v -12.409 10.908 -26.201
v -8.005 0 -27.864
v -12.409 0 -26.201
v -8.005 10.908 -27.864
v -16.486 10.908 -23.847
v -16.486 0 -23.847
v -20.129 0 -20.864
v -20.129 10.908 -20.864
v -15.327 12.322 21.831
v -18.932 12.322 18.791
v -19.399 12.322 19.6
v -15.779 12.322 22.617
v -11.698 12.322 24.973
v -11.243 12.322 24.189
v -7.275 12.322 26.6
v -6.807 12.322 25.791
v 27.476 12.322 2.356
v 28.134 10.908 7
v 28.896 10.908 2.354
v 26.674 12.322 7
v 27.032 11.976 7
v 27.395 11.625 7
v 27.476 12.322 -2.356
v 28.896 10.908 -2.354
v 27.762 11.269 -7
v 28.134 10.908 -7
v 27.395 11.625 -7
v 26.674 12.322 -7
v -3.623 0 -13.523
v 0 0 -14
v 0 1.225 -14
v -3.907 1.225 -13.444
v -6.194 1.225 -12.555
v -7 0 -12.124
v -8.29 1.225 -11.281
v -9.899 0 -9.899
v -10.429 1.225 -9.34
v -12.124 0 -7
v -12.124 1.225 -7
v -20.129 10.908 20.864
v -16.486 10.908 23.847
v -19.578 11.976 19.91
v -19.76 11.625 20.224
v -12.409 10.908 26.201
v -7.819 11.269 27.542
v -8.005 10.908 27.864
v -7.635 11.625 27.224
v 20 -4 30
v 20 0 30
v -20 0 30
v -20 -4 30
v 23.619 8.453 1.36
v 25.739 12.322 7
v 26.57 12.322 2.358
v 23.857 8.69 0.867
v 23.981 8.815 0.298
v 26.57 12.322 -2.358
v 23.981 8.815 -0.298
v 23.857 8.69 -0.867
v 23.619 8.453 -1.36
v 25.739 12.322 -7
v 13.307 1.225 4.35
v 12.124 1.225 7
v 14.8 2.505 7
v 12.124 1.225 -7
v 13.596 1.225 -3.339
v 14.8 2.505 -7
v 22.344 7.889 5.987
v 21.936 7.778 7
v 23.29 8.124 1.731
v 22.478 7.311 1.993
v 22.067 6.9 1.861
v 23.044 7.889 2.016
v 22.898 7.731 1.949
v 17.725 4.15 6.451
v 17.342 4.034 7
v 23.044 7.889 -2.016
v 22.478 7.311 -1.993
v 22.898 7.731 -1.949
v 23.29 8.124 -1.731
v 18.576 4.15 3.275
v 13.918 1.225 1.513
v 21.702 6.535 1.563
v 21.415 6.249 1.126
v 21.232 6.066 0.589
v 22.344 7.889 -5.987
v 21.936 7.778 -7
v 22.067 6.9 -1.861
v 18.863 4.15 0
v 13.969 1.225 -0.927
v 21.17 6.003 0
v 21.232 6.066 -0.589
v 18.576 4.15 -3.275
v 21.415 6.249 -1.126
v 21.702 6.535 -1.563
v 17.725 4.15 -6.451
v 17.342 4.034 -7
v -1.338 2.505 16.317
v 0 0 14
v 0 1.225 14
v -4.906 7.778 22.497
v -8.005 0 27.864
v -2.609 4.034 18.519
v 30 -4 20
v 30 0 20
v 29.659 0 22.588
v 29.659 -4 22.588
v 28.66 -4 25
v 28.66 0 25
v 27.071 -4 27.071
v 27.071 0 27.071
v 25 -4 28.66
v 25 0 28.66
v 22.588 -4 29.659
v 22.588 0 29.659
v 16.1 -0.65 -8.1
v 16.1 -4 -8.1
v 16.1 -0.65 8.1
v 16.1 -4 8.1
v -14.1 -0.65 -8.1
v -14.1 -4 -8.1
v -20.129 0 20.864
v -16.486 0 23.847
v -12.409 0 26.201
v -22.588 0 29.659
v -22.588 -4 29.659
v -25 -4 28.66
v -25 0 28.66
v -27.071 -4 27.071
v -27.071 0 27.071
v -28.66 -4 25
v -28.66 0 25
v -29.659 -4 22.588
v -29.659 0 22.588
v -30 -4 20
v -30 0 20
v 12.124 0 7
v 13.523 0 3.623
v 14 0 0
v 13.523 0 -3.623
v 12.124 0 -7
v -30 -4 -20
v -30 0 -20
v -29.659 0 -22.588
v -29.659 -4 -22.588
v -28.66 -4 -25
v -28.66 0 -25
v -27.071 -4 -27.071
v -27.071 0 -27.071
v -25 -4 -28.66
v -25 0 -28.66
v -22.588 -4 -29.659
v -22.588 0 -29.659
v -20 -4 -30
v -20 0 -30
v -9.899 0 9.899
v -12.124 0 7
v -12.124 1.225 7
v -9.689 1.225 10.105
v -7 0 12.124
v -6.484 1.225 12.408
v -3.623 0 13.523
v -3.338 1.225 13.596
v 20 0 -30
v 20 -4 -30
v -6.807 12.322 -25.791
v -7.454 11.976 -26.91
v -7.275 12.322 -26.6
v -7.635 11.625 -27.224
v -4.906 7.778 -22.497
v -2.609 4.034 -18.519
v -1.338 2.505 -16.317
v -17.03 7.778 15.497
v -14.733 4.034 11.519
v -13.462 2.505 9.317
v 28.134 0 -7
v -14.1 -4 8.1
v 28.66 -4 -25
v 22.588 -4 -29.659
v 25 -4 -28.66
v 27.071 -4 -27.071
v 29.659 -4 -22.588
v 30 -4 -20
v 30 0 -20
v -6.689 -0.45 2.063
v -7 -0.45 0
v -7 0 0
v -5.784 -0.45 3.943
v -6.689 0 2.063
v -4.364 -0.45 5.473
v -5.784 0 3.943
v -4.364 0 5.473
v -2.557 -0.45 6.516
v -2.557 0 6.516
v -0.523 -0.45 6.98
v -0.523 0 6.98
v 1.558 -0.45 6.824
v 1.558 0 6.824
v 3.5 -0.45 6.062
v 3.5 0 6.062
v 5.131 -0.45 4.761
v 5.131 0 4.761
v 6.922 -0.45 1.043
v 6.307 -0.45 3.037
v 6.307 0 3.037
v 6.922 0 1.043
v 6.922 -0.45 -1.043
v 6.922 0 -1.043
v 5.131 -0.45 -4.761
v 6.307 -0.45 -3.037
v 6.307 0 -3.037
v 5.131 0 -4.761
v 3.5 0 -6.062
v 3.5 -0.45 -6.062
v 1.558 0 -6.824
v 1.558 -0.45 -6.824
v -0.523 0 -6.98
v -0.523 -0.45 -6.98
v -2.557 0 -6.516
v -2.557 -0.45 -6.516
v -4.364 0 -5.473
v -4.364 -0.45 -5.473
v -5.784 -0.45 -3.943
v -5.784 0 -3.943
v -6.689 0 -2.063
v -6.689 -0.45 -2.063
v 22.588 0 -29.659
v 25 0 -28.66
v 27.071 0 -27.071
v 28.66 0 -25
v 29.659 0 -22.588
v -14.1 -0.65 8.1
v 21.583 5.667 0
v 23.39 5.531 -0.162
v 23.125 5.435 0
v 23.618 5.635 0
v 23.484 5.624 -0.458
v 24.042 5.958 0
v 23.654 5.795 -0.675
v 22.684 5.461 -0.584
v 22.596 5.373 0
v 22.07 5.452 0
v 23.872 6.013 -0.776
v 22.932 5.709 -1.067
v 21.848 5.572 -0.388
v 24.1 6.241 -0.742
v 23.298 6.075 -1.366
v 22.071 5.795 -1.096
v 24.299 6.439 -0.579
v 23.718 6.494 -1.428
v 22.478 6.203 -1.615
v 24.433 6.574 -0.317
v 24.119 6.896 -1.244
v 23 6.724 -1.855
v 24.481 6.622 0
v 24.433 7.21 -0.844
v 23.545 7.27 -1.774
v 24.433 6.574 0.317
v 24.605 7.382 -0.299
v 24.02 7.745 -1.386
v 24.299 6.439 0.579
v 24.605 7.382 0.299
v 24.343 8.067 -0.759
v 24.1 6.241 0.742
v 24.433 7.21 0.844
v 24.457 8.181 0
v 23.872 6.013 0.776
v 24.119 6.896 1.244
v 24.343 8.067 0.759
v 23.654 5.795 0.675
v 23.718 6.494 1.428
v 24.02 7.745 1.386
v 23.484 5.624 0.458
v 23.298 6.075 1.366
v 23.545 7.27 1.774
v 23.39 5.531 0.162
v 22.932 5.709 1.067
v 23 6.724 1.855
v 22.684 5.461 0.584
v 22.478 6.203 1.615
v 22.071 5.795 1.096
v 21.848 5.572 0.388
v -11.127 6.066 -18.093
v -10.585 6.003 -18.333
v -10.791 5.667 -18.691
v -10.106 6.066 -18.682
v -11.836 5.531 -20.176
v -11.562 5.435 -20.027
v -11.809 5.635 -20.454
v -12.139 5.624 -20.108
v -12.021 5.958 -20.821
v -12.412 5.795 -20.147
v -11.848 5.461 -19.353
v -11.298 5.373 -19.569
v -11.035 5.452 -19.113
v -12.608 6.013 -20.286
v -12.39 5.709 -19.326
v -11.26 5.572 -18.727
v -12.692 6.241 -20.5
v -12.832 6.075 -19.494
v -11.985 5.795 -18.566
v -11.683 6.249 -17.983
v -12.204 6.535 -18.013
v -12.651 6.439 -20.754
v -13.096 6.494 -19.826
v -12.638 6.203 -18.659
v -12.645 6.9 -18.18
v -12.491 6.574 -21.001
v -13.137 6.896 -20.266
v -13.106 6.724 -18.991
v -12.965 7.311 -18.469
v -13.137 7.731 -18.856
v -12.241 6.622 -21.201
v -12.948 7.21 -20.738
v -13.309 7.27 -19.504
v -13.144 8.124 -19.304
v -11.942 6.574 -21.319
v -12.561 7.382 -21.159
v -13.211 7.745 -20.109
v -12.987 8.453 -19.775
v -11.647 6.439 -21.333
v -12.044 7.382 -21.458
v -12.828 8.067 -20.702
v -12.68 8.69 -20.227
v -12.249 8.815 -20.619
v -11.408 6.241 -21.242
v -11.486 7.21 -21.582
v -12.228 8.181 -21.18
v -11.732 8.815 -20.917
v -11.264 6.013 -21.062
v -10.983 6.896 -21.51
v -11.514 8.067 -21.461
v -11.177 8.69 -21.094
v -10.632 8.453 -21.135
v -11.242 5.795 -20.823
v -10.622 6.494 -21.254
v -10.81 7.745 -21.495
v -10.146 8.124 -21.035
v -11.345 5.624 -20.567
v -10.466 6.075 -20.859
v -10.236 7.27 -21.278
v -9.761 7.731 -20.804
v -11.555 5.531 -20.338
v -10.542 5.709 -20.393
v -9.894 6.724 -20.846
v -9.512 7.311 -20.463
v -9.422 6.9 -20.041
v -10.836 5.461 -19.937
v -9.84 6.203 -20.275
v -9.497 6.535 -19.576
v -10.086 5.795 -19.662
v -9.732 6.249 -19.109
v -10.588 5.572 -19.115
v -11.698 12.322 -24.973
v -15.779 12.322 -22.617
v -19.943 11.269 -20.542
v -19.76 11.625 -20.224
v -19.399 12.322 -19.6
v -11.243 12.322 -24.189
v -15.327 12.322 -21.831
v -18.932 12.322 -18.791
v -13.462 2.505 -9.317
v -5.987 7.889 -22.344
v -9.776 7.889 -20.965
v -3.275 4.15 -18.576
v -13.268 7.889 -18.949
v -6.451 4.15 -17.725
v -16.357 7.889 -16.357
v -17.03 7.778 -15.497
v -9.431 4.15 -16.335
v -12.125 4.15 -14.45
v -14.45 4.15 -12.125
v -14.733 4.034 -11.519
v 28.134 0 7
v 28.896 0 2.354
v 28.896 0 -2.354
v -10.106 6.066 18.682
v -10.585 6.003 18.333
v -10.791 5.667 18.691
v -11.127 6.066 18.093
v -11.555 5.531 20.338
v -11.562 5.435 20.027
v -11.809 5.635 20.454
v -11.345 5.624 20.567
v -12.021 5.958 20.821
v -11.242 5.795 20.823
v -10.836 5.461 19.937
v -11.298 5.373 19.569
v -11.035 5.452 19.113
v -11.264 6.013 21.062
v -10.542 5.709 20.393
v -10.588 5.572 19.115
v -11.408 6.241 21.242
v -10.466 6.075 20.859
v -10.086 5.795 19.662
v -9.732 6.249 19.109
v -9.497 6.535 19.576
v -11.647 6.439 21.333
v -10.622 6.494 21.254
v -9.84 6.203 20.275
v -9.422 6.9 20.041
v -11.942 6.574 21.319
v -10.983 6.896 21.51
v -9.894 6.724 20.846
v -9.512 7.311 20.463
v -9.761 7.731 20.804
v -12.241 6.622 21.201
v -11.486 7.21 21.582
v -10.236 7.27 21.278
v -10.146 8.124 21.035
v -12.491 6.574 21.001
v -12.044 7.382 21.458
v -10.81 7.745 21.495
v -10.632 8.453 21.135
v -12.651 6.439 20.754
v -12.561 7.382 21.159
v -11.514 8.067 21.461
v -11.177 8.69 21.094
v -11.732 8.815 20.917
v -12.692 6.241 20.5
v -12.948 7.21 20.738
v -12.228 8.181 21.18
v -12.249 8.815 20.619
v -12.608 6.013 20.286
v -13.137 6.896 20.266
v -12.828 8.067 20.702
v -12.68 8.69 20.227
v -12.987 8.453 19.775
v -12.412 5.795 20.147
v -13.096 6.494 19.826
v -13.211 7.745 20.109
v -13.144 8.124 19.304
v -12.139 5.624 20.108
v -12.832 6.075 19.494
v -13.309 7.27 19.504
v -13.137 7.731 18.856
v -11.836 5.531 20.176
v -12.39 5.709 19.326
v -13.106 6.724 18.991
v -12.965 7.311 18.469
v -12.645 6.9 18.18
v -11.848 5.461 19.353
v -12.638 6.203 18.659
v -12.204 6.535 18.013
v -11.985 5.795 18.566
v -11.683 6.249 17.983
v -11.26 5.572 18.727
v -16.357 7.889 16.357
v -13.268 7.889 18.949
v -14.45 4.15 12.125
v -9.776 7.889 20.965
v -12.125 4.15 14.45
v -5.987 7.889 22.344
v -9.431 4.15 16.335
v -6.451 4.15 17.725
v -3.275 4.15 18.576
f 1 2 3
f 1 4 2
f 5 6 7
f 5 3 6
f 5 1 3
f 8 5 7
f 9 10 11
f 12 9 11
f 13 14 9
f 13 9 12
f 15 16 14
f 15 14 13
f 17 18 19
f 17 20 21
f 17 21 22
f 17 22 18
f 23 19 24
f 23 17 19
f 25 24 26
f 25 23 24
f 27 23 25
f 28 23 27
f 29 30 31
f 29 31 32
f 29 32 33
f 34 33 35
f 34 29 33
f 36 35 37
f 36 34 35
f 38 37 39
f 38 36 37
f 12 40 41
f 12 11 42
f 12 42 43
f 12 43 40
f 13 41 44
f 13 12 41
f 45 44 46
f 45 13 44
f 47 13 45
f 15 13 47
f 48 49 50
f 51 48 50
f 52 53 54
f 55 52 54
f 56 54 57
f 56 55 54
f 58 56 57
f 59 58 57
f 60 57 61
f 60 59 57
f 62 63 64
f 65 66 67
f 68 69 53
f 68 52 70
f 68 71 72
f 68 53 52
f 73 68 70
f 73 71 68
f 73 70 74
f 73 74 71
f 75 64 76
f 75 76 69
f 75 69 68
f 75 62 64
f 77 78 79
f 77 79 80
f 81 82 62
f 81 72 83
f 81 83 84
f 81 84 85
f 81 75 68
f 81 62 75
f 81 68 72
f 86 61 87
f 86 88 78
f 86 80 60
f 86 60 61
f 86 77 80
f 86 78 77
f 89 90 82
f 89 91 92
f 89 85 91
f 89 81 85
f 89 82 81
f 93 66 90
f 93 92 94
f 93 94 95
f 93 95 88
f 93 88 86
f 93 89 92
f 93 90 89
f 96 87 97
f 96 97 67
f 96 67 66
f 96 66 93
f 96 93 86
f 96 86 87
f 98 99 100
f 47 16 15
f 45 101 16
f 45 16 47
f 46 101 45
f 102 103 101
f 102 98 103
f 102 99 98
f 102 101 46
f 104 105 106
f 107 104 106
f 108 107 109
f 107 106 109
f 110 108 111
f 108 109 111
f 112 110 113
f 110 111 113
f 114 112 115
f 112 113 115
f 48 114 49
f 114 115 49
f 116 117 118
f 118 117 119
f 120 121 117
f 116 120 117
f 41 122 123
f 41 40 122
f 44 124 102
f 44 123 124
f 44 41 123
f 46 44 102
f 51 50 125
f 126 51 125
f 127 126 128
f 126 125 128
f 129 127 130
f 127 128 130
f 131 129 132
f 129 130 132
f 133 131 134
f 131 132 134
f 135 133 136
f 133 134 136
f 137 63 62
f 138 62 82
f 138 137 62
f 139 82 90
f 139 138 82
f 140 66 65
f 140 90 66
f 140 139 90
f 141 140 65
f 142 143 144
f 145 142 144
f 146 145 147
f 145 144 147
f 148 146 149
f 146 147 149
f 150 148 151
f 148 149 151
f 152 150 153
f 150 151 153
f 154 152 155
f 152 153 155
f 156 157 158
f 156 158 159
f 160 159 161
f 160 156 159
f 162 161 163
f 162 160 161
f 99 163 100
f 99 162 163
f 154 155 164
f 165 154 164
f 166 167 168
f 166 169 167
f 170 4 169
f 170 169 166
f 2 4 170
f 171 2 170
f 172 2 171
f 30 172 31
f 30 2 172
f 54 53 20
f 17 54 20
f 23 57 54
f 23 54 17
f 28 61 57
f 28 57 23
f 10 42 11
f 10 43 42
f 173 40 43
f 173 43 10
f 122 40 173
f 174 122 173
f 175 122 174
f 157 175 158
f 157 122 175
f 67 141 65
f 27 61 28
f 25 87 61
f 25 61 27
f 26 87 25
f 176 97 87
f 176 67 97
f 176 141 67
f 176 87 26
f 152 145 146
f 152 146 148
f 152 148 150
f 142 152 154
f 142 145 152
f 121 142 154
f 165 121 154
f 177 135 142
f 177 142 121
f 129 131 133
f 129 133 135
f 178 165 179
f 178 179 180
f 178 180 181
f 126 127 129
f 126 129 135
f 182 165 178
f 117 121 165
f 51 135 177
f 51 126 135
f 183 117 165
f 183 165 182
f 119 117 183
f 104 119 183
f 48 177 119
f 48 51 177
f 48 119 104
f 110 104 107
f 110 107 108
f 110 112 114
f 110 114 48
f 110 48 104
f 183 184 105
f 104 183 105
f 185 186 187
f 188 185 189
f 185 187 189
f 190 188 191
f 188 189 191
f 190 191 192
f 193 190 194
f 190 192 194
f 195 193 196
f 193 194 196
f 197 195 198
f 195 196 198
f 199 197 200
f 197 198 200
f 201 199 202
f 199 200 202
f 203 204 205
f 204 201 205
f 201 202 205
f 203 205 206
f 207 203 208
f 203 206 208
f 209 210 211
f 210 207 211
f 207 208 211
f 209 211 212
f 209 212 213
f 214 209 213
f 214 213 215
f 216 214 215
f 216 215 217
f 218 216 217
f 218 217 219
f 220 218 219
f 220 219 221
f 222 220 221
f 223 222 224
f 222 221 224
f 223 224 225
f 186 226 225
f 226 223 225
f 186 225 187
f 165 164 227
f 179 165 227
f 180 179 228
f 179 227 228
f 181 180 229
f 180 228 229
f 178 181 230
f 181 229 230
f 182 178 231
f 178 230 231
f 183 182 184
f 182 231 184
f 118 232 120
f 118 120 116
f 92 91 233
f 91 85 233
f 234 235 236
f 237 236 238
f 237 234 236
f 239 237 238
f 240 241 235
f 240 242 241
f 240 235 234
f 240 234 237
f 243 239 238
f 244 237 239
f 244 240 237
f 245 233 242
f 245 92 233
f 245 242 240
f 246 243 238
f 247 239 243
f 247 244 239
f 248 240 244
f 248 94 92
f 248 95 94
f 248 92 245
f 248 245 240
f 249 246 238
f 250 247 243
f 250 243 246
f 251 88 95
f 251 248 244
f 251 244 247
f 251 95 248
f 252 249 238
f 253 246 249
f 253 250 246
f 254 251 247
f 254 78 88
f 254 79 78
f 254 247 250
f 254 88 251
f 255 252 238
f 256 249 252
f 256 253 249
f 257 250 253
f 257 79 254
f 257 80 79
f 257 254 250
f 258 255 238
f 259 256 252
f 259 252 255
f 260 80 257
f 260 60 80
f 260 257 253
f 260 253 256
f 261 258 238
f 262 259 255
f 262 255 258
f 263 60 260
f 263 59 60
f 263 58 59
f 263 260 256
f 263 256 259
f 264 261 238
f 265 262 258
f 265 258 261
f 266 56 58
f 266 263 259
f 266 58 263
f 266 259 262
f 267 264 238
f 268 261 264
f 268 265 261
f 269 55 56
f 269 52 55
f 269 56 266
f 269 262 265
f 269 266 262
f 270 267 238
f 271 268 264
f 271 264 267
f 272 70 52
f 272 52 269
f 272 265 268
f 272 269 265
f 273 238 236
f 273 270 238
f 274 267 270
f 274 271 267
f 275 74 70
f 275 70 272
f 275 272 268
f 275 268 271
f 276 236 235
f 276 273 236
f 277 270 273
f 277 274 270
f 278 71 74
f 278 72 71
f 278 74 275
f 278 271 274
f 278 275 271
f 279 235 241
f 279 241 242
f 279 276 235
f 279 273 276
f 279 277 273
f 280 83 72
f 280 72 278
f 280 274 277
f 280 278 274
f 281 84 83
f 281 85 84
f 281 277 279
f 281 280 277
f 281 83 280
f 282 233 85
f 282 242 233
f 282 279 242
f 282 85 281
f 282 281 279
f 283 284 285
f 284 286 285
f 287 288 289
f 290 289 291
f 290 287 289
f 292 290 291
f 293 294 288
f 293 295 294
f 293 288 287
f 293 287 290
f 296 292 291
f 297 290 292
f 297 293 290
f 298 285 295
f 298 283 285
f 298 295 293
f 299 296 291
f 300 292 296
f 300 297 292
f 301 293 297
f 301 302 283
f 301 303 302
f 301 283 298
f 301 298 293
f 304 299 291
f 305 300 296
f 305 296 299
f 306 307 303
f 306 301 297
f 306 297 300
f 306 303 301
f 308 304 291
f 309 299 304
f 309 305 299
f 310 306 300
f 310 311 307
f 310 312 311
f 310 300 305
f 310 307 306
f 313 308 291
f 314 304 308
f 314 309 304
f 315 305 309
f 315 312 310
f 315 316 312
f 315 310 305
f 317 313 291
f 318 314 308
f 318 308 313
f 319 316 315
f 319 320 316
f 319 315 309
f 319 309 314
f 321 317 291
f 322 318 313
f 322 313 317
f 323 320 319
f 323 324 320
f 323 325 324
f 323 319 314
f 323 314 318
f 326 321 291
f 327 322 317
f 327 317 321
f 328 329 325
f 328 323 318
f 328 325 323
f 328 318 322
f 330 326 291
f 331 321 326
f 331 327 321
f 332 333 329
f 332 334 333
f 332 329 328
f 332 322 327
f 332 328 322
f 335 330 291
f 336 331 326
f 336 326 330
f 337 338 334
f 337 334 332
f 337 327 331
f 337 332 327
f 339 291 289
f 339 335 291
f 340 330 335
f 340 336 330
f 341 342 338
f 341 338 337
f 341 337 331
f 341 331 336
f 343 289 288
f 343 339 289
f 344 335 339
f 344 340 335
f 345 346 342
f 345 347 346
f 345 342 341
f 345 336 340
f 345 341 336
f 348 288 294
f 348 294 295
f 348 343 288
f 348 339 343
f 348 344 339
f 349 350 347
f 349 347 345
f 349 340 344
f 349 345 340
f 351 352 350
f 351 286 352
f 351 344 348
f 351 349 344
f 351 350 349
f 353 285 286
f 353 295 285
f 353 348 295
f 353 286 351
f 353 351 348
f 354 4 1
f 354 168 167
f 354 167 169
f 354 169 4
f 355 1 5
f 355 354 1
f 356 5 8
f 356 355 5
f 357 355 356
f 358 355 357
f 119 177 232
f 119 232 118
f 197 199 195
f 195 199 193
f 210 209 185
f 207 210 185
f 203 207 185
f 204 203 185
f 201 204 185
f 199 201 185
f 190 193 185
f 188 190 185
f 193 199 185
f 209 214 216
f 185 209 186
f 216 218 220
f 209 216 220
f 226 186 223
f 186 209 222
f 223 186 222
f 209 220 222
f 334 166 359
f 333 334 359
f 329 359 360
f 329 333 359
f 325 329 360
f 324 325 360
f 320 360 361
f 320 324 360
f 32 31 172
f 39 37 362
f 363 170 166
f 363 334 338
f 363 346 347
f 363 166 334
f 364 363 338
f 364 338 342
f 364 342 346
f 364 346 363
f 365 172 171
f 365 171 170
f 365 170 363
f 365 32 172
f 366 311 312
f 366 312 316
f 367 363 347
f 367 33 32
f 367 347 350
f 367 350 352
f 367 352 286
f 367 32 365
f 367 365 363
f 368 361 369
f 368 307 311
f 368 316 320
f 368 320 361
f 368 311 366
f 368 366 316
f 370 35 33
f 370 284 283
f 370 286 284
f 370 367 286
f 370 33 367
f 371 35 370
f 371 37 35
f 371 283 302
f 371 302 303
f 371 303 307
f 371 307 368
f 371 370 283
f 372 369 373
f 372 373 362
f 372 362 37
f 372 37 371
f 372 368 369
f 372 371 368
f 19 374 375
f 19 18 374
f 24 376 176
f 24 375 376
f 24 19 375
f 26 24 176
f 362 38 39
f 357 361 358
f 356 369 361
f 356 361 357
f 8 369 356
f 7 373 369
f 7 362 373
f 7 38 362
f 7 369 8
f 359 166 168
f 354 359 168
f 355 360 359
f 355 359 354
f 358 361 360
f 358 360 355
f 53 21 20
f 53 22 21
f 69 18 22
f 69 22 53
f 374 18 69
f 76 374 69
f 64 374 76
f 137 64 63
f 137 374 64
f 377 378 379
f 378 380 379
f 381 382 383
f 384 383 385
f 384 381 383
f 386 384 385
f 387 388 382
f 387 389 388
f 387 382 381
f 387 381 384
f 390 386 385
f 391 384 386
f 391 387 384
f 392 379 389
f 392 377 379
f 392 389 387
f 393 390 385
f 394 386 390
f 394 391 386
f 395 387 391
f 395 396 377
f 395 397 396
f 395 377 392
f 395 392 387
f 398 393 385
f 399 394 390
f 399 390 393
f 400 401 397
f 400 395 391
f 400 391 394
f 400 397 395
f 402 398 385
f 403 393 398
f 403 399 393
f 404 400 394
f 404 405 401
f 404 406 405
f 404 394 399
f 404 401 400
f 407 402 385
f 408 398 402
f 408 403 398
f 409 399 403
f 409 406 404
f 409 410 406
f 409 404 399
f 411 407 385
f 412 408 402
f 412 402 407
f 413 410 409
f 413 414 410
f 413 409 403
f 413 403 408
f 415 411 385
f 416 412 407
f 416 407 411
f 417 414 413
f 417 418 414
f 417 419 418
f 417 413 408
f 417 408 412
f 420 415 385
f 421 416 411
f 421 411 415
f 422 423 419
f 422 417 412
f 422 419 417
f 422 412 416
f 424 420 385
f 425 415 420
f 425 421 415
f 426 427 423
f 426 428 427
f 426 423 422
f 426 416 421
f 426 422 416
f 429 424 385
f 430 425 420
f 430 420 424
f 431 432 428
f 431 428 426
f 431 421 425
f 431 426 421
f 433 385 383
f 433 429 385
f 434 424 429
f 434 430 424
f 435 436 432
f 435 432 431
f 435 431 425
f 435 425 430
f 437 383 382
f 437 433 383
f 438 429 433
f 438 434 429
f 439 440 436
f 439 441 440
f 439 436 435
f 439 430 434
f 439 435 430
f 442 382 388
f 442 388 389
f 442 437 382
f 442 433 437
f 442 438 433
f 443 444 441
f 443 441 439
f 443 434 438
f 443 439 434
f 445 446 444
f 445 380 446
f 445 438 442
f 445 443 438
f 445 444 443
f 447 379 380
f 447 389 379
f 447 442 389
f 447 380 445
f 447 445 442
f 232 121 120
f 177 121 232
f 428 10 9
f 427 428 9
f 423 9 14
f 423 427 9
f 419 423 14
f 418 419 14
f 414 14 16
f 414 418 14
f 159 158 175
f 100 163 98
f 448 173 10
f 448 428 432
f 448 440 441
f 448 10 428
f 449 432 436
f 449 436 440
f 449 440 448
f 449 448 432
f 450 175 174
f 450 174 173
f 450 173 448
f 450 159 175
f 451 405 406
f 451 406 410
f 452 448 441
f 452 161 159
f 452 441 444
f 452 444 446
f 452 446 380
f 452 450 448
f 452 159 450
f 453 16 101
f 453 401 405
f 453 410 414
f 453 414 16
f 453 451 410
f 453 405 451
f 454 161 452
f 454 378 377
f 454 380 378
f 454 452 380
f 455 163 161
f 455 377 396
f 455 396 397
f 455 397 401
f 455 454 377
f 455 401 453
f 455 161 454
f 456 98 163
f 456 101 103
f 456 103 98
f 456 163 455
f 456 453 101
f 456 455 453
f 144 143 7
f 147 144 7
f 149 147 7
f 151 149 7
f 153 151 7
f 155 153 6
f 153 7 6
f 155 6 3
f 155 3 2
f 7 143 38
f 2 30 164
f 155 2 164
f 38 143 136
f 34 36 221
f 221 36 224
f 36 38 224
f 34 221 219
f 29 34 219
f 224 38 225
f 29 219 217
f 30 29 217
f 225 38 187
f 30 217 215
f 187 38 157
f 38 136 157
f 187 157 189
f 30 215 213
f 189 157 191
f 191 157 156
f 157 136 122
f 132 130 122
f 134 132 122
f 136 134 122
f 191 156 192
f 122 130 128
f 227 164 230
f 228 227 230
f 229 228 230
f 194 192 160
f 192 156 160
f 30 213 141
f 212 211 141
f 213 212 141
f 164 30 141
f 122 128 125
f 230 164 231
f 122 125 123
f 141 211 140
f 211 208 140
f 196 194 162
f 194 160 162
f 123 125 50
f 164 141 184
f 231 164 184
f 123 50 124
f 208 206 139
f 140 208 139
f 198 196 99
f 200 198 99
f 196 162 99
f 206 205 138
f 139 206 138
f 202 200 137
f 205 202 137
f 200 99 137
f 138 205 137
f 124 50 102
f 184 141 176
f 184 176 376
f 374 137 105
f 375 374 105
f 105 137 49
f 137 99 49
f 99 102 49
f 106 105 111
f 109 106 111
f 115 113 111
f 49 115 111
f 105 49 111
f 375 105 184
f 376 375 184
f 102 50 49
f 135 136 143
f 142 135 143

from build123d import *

# Parameters (mm, degrees)
CUT_EXTRUDE_1_DEPTH      = 43.811678643
PATTERN_CIRCULAR_5_COUNT = 3
EXTRUDE_1_DEPTH          = 4
SKETCH_5_R               = 14
CUT_EXTRUDE_2_DEPTH      = 45.179631373
SKETCH_6_R               = 7
CUT_EXTRUDE_3_DEPTH      = 45.17963138
SKETCH_7_W               = 30.2
SKETCH_7_H               = 16.2
CUT_EXTRUDE_4_DEPTH      = 3.35
EXTRUDE_START            = -0.2
SKETCH_8_R               = 7
EXTRUDE_2_DEPTH          = 0.2


with BuildPart() as part:
    # Эскиз1 → Повернуть1 (revolve)
    with BuildSketch(Plane.XY):
        with BuildLine():
            Line((11.135528726, 0), (28.991378029, 0))
            Line((28.991378029, 0), (28.991378029, 10.908116908))
            Line((28.991378029, 10.908116908), (27.577164466, 12.32233047))
            Line((27.577164466, 12.32233047), (26.673957337, 12.32233047))
            ThreePointArc((26.673957337, 12.32233047), (19.883391716, 4.927091635), (11.135528726, 0))
        make_face()
    revolve(axis=Axis((0, 0, 0), (0, 1, 0)))

    # Эскиз2 → Вырез-Вытянуть1 (cut, through all)
    with BuildSketch(Plane.XZ):
        with BuildLine():
            Line((4.04141358, 7), (4.04141358, -7))
            Line((4.04141358, -7), (34.14370091, -7))
            ThreePointArc((34.14370091, -7), (-34.85387083, 0), (34.14370091, 7))
            Line((34.14370091, 7), (28.133609793, 7))
            Line((28.133609793, 7), (4.04141358, 7))
        make_face()
    extrude(amount=-CUT_EXTRUDE_1_DEPTH, mode=Mode.SUBTRACT)

    # Эскиз3 → Вырез-Повернуть3 (revolve, cut)
    with BuildSketch(Plane.XY):
        with BuildLine():
            Line((21.213203436, 8.786796564), (24.04163056, 5.95836944))
            ThreePointArc((24.04163056, 5.95836944), (21.213203436, 5.95836944), (21.213203436, 8.786796564))
        make_face()
    revolve(axis=Axis((0, 30, 0), (0.7071067811865439, -0.7071067811865512, 0)), mode=Mode.SUBTRACT)


with BuildPart() as pattern_circular_5_1:
    # Круговой массив5: pattern copy
    add(part.part.rotate(Axis((0, 0, 0), (0, 1, 0)), 1 * 360 / PATTERN_CIRCULAR_5_COUNT))


with BuildPart() as pattern_circular_5_2:
    # Круговой массив5: pattern copy
    add(part.part.rotate(Axis((0, 0, 0), (0, 1, 0)), 2 * 360 / PATTERN_CIRCULAR_5_COUNT))


with BuildPart() as part_1:
    add(part.part)

    add(pattern_circular_5_1.part)  # Бобышка-Вытянуть1 merges Круговой массив5_1

    add(pattern_circular_5_2.part)  # Бобышка-Вытянуть1 merges Круговой массив5_2
    # Эскиз4 → Бобышка-Вытянуть1 (add)
    with BuildSketch(Plane.XZ):
        with BuildLine():
            Line((-20, -30), (20, -30))
            ThreePointArc((20, -30), (27.071067812, -27.071067812), (30, -20))
            Line((30, -20), (30, 20))
            ThreePointArc((30, 20), (27.071067812, 27.071067812), (20, 30))
            Line((20, 30), (-20, 30))
            ThreePointArc((-20, 30), (-27.071067812, 27.071067812), (-30, 20))
            Line((-30, 20), (-30, -20))
            ThreePointArc((-30, -20), (-27.071067812, -27.071067812), (-20, -30))
        make_face()
    extrude(amount=EXTRUDE_1_DEPTH)

    # Эскиз5 → Вырез-Вытянуть2 (cut, through all)
    with BuildSketch(Plane(origin=(0, 0, 0), x_dir=(1, 0, 0), z_dir=(0, 1, 0))):
        Circle(SKETCH_5_R)
    extrude(amount=CUT_EXTRUDE_2_DEPTH, mode=Mode.SUBTRACT)

    # Эскиз6 → Вырез-Вытянуть3 (cut, through all)
    with BuildSketch(Plane(origin=(0, 0, 0), x_dir=(1, 0, 0), z_dir=(0, 1, 0))):
        Circle(SKETCH_6_R)
    extrude(amount=-CUT_EXTRUDE_3_DEPTH, mode=Mode.SUBTRACT)

    # Эскиз7 → Вырез-Вытянуть4 (cut)
    with BuildSketch(Plane.XZ.offset(4)):
        with Locations((1, 0)):
            Rectangle(SKETCH_7_W, SKETCH_7_H)
    extrude(amount=-CUT_EXTRUDE_4_DEPTH, mode=Mode.SUBTRACT)

    # Эскиз8 → Бобышка-Вытянуть2 (add)
    with BuildSketch(Plane.XZ.offset(0.65).offset(EXTRUDE_START)):
        Circle(SKETCH_8_R)
    extrude(amount=EXTRUDE_2_DEPTH)


solid = part_1.part
